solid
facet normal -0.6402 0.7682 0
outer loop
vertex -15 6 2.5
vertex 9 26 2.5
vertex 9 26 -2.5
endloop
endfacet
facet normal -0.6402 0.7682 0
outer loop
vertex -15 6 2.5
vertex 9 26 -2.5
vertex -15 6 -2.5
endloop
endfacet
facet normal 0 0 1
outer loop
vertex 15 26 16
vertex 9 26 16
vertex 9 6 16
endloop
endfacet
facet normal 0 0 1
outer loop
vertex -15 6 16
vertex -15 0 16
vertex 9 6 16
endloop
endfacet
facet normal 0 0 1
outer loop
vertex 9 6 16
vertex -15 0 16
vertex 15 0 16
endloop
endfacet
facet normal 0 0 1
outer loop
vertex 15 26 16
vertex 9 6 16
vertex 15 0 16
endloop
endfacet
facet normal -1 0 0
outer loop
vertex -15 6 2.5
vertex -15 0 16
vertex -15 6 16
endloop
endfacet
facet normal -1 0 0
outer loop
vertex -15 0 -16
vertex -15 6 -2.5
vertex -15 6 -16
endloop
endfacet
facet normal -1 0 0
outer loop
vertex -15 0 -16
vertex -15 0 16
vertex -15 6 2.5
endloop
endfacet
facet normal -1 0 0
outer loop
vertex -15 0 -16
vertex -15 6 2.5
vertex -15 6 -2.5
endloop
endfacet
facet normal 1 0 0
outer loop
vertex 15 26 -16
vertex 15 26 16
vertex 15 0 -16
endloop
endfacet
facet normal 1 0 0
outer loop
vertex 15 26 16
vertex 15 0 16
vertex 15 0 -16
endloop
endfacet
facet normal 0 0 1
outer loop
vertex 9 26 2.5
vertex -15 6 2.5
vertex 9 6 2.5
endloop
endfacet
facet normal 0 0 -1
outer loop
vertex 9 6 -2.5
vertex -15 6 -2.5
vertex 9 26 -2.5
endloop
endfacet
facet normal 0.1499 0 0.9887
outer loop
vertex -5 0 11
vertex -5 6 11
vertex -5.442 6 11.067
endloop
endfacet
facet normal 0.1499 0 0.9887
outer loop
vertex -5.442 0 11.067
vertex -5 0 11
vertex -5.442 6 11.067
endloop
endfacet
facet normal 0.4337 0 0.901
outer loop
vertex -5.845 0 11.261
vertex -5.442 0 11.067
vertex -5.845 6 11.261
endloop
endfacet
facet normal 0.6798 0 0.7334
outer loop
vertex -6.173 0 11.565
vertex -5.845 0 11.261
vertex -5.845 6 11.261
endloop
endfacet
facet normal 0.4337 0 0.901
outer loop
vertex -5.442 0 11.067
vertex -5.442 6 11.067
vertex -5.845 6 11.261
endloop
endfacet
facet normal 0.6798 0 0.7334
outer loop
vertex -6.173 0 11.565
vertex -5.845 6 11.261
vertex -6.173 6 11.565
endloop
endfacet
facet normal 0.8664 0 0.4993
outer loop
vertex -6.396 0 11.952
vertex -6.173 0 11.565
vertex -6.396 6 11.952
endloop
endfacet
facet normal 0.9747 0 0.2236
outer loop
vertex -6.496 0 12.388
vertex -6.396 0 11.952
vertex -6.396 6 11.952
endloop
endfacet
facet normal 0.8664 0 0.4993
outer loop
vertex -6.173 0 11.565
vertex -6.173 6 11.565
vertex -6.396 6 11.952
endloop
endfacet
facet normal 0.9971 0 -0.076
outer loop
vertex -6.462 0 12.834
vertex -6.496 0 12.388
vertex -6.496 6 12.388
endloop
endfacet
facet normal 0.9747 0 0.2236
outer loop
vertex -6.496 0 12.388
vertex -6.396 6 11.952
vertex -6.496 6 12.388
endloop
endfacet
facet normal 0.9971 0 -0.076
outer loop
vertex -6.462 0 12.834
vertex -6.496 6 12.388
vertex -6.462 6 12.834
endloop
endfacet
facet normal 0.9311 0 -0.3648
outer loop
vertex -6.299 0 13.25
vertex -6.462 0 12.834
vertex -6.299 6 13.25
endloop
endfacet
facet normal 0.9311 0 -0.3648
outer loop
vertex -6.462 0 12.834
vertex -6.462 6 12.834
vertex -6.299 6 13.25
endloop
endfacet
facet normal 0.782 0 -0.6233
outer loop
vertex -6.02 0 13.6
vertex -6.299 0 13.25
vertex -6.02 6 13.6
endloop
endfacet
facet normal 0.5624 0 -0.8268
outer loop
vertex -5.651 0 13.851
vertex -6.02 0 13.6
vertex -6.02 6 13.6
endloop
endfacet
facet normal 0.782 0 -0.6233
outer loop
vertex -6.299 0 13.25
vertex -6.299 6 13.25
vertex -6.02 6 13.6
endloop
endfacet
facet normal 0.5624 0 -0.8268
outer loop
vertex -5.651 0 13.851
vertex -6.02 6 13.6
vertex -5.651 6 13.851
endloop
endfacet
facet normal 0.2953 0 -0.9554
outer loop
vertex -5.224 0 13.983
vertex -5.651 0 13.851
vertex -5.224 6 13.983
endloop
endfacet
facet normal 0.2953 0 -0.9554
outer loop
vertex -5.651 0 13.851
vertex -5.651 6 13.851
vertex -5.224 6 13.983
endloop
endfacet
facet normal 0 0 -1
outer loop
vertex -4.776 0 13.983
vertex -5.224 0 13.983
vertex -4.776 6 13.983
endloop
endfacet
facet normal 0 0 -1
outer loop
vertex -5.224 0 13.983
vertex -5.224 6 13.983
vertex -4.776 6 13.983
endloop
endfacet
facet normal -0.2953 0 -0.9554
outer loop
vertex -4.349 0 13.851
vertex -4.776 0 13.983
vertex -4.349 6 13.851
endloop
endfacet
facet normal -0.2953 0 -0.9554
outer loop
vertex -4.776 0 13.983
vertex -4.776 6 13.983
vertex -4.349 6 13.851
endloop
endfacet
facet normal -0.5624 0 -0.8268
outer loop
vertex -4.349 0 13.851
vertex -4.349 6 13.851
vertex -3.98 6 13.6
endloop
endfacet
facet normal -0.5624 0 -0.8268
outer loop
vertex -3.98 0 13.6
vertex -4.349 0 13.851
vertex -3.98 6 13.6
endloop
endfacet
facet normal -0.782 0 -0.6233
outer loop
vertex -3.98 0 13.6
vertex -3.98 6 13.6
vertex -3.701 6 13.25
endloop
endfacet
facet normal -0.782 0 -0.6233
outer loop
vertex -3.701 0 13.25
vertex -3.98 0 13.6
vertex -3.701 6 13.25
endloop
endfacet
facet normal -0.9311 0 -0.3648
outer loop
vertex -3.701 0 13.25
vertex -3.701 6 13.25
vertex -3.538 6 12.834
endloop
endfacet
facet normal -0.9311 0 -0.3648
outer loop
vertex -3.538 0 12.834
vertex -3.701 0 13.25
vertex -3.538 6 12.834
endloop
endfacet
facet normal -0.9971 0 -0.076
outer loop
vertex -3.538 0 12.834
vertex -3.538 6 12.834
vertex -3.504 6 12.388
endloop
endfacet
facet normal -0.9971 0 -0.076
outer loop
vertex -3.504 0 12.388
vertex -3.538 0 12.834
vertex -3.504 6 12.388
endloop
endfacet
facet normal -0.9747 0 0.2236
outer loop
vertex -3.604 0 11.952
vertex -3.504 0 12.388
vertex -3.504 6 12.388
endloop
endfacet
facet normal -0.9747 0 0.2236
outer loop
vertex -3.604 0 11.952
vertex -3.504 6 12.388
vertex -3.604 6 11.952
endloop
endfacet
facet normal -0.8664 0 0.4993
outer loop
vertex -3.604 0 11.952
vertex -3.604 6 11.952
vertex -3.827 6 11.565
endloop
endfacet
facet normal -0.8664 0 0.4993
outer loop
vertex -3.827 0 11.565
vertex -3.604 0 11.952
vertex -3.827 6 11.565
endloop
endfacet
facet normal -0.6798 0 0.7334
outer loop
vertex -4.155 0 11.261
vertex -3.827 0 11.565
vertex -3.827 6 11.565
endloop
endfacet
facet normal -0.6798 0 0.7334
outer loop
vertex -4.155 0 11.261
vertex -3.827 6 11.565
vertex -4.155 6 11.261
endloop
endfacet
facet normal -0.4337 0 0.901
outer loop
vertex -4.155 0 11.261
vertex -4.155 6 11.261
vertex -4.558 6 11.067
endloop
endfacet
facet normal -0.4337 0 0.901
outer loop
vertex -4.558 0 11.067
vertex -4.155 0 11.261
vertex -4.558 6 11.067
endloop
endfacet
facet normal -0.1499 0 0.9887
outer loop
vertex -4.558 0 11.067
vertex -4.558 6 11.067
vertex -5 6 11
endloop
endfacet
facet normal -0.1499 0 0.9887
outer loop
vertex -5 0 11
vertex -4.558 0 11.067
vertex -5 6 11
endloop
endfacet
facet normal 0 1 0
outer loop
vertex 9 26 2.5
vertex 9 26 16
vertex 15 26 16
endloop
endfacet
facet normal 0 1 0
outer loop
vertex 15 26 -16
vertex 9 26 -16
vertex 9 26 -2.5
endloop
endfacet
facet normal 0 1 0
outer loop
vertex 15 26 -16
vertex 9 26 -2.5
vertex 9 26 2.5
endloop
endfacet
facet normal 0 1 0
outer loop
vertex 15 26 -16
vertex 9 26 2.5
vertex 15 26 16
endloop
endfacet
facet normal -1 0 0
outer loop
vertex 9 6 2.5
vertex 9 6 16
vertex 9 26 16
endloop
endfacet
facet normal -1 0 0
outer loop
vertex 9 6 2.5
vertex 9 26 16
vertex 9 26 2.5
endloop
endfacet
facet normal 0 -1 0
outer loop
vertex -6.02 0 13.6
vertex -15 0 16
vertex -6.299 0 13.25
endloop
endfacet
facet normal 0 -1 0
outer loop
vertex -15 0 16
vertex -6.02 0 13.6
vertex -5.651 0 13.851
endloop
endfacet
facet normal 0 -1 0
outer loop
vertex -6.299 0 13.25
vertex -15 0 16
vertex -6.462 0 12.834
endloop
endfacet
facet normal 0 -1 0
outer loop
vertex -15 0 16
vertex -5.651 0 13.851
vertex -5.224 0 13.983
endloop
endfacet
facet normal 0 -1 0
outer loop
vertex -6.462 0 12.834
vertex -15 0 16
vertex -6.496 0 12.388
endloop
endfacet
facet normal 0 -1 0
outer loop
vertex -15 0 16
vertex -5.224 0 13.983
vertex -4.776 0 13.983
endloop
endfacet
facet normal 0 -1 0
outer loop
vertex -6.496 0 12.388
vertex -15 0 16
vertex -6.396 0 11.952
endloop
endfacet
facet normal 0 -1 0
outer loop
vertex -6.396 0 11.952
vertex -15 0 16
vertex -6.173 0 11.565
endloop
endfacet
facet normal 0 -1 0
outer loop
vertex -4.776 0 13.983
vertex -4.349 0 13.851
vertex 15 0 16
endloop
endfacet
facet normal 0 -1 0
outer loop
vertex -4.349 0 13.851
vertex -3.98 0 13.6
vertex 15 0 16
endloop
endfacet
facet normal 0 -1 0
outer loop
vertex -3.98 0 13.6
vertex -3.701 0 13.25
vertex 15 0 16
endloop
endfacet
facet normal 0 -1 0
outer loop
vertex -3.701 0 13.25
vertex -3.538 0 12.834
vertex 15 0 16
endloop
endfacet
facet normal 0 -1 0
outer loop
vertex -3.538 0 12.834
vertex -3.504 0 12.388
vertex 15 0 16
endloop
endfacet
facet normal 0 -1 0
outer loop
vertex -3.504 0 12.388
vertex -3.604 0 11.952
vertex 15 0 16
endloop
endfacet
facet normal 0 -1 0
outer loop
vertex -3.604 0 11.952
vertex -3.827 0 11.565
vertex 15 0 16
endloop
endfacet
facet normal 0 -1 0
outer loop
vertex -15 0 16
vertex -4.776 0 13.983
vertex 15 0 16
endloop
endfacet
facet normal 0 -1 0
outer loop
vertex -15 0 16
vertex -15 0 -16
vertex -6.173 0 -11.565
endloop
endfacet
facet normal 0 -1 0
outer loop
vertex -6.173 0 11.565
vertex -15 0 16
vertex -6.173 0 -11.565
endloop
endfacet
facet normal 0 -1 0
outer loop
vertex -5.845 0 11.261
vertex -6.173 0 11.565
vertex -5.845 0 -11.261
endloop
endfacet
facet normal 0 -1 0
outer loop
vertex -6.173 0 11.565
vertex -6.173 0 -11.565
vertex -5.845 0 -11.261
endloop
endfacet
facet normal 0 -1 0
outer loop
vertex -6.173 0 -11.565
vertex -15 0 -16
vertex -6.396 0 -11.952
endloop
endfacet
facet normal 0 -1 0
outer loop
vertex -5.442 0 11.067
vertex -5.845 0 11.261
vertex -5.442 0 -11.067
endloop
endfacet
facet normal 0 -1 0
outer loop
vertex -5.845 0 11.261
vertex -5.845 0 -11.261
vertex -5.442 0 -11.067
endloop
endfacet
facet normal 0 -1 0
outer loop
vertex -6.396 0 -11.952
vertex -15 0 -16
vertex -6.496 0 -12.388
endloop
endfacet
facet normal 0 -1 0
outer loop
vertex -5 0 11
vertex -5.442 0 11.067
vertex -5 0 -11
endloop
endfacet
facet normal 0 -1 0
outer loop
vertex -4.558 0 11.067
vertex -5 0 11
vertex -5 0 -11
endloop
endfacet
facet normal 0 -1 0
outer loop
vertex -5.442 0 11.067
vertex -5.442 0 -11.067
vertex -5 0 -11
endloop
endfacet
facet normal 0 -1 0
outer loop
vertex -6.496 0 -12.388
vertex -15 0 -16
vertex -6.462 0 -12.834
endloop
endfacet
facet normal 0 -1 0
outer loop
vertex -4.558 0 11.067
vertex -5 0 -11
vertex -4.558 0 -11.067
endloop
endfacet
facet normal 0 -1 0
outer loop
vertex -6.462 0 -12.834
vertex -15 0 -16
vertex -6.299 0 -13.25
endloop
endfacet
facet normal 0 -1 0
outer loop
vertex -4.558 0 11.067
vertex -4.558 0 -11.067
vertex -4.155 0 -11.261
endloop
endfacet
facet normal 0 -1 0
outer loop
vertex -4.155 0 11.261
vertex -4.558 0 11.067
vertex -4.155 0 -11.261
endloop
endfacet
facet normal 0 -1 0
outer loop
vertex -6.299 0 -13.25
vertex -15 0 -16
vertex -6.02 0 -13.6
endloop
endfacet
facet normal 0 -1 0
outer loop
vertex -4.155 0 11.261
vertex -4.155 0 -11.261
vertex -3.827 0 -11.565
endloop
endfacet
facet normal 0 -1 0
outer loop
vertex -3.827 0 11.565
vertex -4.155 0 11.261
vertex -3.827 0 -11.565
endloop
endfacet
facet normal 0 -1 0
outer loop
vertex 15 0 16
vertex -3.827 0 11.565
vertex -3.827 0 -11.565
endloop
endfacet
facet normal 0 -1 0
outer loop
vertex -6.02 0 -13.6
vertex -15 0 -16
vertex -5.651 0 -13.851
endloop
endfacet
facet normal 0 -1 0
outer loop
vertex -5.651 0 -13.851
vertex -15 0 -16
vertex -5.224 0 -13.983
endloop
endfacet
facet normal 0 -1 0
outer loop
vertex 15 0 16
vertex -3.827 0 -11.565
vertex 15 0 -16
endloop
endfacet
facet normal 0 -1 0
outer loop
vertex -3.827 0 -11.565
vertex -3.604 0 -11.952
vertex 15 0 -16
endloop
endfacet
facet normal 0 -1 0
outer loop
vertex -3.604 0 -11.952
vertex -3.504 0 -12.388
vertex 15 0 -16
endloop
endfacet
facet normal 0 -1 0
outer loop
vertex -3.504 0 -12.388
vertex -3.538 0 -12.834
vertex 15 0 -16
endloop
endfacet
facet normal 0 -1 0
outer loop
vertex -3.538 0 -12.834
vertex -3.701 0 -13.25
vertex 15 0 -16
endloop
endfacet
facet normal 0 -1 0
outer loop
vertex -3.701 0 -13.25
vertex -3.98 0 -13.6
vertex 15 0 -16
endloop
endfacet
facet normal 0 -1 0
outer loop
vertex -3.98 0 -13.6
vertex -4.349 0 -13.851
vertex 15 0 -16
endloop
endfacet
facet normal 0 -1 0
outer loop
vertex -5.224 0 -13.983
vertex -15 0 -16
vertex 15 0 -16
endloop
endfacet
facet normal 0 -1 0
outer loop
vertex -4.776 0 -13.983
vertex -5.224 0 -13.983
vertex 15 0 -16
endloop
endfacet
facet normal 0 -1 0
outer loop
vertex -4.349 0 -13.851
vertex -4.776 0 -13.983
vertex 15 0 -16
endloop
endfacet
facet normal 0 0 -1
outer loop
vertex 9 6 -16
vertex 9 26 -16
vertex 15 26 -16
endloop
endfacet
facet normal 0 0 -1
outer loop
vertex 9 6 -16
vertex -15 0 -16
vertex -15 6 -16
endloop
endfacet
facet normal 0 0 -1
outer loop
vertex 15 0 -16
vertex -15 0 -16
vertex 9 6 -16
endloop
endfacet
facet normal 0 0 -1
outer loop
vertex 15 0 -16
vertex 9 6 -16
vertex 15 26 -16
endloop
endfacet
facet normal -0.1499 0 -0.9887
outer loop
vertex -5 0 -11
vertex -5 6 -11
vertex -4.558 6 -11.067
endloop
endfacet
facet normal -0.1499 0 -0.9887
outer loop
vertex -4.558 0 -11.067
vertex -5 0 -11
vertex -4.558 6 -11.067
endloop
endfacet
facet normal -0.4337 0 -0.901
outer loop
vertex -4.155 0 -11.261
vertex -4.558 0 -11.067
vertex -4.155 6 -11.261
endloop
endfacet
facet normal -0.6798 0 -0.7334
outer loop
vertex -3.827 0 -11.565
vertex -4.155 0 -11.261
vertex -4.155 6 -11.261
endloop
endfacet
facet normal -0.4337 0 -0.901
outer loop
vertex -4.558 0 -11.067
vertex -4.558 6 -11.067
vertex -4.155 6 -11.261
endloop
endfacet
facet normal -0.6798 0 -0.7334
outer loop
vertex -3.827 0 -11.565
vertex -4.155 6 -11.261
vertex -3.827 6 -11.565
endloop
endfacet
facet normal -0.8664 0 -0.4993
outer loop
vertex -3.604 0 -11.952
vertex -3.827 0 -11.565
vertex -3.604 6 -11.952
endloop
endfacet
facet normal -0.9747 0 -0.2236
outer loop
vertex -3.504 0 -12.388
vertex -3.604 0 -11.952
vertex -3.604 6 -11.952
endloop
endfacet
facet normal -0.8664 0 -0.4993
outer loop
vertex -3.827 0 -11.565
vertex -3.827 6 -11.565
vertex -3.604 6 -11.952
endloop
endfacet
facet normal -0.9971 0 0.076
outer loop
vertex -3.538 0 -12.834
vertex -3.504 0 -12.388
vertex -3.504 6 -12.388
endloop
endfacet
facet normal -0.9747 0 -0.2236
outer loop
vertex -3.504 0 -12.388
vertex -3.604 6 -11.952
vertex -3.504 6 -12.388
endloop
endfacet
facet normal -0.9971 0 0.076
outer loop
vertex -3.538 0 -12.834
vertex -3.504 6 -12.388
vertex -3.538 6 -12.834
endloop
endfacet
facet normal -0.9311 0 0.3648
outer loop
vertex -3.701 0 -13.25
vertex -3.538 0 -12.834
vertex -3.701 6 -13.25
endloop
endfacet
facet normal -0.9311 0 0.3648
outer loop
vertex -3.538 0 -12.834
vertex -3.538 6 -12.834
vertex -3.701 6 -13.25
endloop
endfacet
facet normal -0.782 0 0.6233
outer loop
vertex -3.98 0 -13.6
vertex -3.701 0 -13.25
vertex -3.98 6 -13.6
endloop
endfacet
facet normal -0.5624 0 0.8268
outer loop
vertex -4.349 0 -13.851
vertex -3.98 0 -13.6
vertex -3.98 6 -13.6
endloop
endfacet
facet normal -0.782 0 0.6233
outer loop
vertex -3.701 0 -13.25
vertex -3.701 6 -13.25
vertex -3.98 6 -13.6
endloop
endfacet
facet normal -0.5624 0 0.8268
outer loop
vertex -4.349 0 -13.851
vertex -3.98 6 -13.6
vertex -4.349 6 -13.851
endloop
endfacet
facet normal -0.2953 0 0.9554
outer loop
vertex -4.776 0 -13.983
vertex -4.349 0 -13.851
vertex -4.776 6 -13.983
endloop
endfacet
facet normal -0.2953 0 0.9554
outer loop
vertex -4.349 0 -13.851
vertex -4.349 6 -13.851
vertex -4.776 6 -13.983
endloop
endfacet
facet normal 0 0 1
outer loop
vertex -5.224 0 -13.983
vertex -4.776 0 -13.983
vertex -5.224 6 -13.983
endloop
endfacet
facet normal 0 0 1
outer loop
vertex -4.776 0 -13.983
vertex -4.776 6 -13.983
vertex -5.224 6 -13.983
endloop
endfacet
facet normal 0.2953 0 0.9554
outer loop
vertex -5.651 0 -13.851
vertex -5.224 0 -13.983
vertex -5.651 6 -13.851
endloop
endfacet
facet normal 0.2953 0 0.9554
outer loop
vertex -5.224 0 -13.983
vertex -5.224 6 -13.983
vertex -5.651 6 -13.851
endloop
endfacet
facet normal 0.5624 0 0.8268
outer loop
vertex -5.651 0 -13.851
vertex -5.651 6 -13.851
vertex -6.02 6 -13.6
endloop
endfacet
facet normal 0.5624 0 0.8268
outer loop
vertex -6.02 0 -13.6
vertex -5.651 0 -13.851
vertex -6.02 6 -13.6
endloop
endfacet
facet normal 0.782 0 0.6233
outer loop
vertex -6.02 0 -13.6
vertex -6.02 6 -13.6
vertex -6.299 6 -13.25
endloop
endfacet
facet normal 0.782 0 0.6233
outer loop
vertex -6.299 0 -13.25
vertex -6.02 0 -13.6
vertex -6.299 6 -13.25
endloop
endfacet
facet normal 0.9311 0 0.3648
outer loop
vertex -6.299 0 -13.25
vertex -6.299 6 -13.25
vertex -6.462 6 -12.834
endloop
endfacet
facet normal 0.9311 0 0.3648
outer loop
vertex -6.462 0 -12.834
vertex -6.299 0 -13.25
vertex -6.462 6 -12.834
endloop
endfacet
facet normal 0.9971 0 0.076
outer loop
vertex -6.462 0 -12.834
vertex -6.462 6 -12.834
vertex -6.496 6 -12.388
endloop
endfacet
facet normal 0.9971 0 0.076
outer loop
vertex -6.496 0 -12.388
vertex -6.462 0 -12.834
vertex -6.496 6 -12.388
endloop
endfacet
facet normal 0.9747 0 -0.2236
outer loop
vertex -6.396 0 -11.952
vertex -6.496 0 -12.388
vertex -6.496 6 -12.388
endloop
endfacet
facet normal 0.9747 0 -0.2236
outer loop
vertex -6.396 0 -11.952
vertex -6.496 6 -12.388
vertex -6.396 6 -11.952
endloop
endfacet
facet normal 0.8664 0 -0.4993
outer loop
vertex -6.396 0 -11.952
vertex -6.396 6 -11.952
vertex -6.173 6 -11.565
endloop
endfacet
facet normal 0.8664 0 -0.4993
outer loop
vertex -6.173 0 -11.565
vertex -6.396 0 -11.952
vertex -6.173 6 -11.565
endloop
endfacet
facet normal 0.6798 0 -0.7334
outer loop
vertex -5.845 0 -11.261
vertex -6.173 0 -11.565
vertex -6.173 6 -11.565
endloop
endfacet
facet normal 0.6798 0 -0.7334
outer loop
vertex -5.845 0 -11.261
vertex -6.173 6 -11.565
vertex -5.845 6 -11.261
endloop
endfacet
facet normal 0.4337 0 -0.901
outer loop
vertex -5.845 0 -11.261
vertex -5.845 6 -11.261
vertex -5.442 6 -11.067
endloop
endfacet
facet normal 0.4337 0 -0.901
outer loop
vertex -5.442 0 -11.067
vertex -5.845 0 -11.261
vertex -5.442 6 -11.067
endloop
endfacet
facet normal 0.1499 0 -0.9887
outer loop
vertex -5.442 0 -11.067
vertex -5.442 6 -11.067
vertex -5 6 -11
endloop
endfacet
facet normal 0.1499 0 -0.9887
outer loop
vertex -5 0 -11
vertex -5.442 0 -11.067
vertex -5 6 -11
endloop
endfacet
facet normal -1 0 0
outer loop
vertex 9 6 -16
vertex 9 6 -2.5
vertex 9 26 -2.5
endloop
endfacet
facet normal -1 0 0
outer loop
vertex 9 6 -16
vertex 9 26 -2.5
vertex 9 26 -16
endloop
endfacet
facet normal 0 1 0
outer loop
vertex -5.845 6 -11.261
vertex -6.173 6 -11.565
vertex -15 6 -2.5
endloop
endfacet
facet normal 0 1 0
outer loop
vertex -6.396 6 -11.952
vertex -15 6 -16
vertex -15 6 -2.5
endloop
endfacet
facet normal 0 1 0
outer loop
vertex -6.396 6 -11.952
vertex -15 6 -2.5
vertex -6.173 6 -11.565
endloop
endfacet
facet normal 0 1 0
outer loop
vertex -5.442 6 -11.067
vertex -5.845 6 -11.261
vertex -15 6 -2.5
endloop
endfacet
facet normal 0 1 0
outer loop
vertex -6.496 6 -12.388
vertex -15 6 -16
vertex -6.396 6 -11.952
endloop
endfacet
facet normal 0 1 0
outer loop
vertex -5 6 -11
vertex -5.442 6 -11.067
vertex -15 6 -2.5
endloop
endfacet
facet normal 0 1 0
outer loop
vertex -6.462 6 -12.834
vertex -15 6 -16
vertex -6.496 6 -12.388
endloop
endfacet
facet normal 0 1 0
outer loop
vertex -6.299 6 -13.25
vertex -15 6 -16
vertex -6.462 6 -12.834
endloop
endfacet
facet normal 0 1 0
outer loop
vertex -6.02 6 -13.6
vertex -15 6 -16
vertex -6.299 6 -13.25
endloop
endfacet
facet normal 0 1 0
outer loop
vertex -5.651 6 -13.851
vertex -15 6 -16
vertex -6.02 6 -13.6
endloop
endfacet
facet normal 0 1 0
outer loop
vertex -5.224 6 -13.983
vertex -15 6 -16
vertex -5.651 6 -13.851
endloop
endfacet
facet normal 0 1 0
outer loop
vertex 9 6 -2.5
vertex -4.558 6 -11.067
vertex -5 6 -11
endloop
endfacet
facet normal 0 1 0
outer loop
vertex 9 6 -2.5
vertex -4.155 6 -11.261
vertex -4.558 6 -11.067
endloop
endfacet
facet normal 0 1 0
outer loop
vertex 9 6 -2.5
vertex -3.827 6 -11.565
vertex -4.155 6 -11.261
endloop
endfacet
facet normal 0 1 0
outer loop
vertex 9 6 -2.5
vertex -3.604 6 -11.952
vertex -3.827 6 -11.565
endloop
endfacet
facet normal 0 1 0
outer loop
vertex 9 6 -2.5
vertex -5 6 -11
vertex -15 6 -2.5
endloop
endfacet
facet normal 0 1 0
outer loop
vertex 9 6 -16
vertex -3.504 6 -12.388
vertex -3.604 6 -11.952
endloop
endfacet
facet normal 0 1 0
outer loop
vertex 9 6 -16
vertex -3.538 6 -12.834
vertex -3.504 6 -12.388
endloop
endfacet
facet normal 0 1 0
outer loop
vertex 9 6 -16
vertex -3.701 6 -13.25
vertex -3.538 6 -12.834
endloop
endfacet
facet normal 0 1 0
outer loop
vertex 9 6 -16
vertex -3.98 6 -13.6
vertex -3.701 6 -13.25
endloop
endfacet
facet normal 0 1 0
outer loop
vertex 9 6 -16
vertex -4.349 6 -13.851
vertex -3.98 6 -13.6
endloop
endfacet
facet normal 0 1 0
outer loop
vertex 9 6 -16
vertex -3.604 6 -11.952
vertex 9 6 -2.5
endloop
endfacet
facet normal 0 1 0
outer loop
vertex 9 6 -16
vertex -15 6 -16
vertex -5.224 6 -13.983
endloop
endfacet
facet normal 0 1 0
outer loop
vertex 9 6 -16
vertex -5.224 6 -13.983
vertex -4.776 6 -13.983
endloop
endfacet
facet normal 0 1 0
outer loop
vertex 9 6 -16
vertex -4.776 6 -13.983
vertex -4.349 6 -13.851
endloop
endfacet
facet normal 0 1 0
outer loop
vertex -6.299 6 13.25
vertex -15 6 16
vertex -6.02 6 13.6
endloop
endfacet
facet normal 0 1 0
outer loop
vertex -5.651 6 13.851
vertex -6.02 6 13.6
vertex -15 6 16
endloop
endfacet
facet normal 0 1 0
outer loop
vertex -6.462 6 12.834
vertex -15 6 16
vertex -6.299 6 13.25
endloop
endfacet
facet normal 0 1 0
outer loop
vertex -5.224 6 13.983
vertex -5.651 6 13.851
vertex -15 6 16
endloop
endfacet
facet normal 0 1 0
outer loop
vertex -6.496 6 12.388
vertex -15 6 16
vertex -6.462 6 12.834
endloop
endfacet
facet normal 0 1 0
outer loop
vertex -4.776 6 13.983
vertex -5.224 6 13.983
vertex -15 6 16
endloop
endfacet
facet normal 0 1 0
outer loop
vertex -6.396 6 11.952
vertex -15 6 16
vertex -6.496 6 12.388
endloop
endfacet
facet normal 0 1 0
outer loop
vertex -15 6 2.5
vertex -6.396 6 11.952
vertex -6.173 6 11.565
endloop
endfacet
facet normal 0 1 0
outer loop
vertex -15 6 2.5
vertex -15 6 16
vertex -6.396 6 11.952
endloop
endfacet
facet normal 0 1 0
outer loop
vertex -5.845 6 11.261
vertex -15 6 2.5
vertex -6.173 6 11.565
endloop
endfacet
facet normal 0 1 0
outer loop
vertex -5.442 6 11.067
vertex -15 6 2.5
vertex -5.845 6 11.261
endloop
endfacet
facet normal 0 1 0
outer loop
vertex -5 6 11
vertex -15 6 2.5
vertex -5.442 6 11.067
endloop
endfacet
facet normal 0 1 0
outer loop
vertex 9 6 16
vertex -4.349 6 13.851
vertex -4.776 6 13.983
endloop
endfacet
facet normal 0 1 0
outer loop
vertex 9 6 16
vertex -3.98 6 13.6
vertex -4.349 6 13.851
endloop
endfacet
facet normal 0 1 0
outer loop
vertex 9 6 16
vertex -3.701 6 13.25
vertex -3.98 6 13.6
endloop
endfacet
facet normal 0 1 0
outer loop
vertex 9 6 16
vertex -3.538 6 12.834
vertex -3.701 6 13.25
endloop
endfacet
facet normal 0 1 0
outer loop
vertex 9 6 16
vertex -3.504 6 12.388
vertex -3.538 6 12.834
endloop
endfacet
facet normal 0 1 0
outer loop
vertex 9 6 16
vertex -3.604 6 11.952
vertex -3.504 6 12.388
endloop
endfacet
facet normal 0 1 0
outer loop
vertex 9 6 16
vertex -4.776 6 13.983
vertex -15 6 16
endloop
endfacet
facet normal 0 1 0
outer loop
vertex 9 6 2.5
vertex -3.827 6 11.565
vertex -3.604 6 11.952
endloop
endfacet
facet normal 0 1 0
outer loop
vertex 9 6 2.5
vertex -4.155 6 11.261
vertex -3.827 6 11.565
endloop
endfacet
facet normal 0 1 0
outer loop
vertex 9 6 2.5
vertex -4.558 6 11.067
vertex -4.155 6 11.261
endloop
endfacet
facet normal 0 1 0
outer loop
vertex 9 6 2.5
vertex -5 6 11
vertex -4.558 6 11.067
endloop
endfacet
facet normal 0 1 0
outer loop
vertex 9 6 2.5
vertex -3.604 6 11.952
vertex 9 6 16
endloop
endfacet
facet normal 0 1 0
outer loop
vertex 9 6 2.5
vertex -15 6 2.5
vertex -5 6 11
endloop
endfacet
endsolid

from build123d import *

# Parameters (mm, degrees)
SKETCH_1_W          = 30
SKETCH_1_H          = 32
EXTRUDE_1_DEPTH     = 6
SKETCH_2_W          = 6
SKETCH_2_H          = 32
EXTRUDE_2_DEPTH     = 20
SKETCH_4_R          = 1.5
CUT_EXTRUDE_1_DEPTH = 30.681644159
SKETCH_5_W          = 24
SKETCH_5_H          = 5
EXTRUDE_3_DEPTH     = 20
CUT_EXTRUDE_2_DEPTH = 36.259750425


with BuildPart() as part:
    # 草图1 → 凸台-拉伸1 (new body)
    with BuildSketch(Plane(origin=(0, 0, 0), x_dir=(1, 0, 0), z_dir=(0, 1, 0))):
        Rectangle(SKETCH_1_W, SKETCH_1_H)
    extrude(amount=EXTRUDE_1_DEPTH)

    # 草图2 → 凸台-拉伸2 (add)
    with BuildSketch(Plane(origin=(0, 6, 0), x_dir=(1, 0, 0), z_dir=(0, 1, 0))):
        with Locations((12, 0)):
            Rectangle(SKETCH_2_W, SKETCH_2_H)
    extrude(amount=EXTRUDE_2_DEPTH)

    # 草图4 → 切除-拉伸1 (cut, through all)
    with BuildSketch(Plane(origin=(0, 6, 0), x_dir=(1, 0, 0), z_dir=(0, 1, 0))):
        with Locations(Location((-5, 12.5, 0), (0, 0, 270))):
            Circle(SKETCH_4_R)
        with Locations(Location((-5, -12.5, 0), (0, 0, 90))):
            Circle(SKETCH_4_R)
    extrude(amount=-CUT_EXTRUDE_1_DEPTH, mode=Mode.SUBTRACT)

    # 草图5 → 凸台-拉伸3 (add, through all)
    with BuildSketch(Plane(origin=(0, 6, 0), x_dir=(1, 0, 0), z_dir=(0, 1, 0))):
        with Locations((-3, 0)):
            Rectangle(SKETCH_5_W, SKETCH_5_H)
    extrude(amount=EXTRUDE_3_DEPTH)

    # 草图6 → 切除-拉伸2 (cut, through all)
    with BuildSketch(Plane.XY.offset(2.5)):
        Polygon((-15, 6), (-15, 26), (9, 26), align=None)
    extrude(amount=-CUT_EXTRUDE_2_DEPTH, mode=Mode.SUBTRACT)


solid = part.part
